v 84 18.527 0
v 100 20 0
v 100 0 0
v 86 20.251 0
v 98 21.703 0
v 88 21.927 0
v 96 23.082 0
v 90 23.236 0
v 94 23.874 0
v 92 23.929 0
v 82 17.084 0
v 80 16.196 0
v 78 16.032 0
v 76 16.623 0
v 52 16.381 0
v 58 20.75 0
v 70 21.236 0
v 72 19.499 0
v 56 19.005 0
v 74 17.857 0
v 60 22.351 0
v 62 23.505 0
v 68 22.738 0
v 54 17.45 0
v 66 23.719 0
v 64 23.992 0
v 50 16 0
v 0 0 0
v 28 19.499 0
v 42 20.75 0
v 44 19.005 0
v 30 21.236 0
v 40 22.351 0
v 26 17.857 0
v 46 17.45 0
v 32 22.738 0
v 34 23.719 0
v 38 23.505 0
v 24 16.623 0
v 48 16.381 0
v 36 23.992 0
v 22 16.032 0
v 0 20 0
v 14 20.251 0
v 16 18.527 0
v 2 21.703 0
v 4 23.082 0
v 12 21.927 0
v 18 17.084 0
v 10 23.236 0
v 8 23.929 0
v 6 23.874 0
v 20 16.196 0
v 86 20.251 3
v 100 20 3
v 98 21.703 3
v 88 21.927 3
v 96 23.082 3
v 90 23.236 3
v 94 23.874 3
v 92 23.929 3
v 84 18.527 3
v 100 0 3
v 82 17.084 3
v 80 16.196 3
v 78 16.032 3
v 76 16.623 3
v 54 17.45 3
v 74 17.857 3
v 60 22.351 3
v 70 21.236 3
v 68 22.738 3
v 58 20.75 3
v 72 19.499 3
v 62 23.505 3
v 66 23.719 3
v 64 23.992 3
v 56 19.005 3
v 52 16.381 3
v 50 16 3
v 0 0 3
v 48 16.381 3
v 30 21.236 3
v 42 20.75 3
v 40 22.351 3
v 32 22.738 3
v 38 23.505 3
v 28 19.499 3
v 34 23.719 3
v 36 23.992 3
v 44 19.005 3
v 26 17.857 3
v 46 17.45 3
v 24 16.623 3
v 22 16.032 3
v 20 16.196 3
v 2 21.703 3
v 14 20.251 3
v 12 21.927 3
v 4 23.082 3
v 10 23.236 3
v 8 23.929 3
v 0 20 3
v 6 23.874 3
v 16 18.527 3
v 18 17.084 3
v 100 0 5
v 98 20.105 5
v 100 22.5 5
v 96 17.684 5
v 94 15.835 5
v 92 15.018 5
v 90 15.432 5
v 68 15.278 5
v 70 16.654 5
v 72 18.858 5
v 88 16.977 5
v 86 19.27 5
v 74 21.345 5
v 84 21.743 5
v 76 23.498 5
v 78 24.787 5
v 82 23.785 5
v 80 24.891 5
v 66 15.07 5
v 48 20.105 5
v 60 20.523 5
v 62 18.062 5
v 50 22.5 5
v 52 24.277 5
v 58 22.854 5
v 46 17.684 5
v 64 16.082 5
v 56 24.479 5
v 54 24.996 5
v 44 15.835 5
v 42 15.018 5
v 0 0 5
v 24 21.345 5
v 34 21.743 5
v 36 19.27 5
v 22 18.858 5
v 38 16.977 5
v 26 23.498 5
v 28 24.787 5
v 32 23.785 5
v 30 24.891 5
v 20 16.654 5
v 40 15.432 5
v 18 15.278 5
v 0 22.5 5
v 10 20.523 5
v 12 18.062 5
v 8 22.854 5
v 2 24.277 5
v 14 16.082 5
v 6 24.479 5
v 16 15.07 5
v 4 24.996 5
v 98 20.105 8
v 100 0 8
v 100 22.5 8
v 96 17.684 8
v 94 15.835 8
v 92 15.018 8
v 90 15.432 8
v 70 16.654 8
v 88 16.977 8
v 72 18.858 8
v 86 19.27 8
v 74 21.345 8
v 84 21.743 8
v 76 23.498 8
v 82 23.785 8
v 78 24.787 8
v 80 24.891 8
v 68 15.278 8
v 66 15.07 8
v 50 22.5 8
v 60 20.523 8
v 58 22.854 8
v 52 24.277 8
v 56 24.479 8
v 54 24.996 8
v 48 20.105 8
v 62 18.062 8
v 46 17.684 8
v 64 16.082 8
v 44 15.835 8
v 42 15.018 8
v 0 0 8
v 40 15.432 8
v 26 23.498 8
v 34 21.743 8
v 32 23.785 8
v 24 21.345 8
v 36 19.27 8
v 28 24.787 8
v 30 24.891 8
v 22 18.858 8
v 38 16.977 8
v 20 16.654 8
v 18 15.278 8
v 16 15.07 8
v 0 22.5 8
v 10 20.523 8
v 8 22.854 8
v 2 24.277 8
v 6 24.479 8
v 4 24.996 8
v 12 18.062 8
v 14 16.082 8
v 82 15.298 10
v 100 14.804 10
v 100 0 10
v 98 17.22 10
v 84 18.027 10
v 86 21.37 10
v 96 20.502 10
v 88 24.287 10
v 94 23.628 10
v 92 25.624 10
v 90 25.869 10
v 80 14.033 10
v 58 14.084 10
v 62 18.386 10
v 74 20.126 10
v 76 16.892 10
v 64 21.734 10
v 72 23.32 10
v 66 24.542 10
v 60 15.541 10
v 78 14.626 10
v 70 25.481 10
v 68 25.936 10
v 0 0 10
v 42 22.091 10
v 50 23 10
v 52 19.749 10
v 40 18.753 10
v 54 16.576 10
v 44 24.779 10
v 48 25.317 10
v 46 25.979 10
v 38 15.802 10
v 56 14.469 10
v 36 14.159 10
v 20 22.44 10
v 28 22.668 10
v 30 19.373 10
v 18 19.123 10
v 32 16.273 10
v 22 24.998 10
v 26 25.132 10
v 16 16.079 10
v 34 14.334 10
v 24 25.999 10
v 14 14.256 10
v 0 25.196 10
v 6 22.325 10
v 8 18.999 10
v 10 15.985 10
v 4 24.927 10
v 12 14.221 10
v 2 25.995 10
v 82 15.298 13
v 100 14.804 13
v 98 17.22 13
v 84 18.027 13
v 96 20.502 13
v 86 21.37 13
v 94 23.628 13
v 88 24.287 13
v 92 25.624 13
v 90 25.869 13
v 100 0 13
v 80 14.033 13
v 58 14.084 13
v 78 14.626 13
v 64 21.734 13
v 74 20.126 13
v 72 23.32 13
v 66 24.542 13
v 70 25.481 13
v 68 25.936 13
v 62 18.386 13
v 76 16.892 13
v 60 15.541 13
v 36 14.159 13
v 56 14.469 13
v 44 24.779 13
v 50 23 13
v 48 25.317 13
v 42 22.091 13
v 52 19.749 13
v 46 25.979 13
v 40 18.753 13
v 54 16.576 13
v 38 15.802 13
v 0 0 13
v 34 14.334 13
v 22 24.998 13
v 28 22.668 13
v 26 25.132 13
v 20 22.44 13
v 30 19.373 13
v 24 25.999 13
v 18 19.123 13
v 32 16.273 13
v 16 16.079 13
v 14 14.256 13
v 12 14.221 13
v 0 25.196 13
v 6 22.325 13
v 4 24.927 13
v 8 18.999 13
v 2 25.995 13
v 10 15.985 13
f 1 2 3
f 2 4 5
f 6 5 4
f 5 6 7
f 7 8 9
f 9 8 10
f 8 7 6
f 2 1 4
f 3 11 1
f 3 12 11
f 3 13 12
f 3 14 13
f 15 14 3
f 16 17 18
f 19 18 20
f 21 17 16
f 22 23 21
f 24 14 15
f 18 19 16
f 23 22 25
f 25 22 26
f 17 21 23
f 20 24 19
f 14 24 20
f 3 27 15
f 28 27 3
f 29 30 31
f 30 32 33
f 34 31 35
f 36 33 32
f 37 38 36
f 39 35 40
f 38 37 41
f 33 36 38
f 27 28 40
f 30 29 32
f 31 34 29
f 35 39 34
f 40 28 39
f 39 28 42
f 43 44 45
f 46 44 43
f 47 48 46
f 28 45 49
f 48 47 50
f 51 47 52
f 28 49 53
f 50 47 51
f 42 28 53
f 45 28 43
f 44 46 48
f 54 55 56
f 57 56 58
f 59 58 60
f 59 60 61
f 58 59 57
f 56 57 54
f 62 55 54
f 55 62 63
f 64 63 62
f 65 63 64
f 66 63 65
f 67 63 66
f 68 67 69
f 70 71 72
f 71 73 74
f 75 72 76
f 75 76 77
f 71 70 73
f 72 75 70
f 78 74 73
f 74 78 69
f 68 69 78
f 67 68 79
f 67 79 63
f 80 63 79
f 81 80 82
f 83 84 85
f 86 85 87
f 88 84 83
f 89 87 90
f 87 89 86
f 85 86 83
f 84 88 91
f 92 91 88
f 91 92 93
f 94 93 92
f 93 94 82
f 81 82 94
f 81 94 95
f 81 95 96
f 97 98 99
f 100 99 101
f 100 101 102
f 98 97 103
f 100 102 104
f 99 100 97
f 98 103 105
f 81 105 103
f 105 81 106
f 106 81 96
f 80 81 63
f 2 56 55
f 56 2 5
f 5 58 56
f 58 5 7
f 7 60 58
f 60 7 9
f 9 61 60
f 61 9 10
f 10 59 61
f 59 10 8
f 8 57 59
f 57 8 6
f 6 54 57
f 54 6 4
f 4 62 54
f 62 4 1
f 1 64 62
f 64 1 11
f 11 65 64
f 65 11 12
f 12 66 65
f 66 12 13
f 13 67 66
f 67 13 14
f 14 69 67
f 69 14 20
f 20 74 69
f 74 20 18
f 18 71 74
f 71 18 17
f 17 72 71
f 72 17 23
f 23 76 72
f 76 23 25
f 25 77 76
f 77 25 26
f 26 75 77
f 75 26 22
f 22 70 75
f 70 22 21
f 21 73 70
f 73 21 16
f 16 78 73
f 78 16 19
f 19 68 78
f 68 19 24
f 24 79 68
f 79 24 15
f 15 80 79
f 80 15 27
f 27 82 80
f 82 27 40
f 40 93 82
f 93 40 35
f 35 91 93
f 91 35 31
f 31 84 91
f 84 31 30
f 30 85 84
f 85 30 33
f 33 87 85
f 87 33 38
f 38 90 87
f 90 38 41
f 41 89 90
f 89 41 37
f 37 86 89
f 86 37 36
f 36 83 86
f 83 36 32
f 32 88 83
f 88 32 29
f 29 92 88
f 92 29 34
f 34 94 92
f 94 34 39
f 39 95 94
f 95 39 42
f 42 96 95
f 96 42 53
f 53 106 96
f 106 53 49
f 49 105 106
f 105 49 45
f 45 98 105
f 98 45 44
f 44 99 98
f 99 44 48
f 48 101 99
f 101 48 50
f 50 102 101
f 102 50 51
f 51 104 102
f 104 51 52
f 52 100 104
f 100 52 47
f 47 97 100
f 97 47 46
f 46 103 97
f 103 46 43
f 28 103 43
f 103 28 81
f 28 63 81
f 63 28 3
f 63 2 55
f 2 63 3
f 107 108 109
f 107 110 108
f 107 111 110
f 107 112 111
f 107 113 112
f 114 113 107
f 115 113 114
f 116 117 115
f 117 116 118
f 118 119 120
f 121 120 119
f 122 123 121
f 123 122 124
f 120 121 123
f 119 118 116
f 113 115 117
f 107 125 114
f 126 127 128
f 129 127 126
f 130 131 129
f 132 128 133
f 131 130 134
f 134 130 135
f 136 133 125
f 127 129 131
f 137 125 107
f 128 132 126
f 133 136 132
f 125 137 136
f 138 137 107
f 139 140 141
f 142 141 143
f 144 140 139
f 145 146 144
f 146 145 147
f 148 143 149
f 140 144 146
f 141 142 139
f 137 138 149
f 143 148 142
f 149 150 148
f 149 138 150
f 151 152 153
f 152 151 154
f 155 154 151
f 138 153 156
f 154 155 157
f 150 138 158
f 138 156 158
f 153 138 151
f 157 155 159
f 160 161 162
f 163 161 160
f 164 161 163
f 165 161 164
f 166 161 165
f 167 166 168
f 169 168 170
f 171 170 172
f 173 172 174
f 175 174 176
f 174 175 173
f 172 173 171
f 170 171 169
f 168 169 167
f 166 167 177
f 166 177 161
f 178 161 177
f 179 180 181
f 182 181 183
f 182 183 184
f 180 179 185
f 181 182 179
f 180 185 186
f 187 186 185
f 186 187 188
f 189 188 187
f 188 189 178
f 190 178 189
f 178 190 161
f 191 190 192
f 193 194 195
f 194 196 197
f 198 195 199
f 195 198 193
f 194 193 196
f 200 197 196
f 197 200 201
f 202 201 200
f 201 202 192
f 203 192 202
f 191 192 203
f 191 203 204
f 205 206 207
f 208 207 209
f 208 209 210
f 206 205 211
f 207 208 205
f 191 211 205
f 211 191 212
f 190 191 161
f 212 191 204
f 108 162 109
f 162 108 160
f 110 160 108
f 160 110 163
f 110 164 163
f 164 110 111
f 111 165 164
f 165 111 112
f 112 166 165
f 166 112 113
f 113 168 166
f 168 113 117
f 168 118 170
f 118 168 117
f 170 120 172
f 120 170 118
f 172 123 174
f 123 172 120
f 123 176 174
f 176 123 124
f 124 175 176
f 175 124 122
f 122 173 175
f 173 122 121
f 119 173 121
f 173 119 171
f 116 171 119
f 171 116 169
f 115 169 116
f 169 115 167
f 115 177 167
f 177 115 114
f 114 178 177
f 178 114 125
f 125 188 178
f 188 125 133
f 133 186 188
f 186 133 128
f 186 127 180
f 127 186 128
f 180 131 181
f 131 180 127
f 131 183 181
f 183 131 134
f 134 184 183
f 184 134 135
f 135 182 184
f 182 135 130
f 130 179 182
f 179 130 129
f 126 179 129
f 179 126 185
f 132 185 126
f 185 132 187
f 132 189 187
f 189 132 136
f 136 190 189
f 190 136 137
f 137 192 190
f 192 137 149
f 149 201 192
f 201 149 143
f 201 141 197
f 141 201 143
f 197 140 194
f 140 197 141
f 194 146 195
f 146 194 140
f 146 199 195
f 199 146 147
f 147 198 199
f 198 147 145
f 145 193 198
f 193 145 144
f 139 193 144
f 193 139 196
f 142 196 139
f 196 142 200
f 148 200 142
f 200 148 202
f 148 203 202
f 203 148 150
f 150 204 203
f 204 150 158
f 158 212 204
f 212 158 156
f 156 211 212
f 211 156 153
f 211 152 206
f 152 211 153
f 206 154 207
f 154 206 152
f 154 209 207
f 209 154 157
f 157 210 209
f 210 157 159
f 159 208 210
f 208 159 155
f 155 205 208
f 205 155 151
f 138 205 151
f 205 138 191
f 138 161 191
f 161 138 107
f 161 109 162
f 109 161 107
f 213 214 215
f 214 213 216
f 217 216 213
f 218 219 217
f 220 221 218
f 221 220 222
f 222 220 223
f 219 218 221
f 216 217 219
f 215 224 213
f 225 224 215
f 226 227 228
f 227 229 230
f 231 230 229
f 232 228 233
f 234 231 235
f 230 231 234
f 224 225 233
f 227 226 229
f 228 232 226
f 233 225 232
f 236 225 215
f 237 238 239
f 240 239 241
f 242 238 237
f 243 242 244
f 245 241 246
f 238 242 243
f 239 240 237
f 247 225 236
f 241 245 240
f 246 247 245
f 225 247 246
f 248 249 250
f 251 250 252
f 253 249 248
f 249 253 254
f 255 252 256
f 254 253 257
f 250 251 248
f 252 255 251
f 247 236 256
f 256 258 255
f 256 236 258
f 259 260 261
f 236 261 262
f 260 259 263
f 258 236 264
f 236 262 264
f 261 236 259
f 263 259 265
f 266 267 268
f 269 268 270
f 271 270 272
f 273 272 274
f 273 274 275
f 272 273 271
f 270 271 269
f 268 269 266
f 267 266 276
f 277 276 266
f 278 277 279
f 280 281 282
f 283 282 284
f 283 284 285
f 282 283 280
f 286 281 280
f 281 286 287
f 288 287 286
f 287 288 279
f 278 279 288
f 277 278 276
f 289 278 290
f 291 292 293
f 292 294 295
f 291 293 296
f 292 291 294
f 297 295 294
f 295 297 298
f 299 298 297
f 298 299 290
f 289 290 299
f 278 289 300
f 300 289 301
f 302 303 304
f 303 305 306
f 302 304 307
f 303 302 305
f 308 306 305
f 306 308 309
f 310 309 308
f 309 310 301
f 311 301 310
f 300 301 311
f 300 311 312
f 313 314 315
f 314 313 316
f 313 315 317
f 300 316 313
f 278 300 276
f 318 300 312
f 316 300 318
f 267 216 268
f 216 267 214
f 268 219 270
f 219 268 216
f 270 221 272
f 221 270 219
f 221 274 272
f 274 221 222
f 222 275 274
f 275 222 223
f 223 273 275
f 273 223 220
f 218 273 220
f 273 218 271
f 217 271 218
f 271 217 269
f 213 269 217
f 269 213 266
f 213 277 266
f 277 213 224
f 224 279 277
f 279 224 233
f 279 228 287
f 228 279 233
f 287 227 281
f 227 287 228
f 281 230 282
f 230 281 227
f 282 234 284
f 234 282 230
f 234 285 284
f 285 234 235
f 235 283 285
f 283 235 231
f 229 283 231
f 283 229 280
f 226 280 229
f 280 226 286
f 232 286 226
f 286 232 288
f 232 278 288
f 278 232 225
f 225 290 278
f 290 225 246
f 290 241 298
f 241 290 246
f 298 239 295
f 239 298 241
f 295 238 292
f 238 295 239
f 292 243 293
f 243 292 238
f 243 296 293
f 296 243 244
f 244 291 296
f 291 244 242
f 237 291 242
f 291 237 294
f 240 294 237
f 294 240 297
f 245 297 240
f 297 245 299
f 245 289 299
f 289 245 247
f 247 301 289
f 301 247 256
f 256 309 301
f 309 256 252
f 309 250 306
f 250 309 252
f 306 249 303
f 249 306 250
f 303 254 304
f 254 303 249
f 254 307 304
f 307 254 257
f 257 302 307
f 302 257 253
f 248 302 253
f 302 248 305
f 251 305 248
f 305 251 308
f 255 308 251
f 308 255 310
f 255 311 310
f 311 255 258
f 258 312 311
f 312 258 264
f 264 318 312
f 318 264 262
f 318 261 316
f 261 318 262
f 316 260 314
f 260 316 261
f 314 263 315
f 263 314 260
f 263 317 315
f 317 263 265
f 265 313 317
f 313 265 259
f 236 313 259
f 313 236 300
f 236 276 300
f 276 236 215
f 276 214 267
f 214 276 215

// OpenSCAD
// =============================================================================
// OCEAN WAVE LAYERS - Standalone Component
// Starry Night Kinetic Sculpture - Static Decorative Elements
// =============================================================================
// 3 layered wave shapes creating depth in ocean area (Zone 1 - Far Ocean)
// STATIC - No animation required
// =============================================================================

$fn = 64;

// =============================================================================
// PARAMETERS
// =============================================================================

// Layer dimensions
WAVE_WIDTH = 100;       // mm - along X-axis
WAVE_DEPTH = 40;        // mm - along Y-axis
WAVE_THICKNESS = 3;     // mm - Z height of each layer

// Z positions for each layer
L1_Z = 0;               // Base layer (darkest)
L2_Z = 5;               // Middle layer
L3_Z = 10;              // Top layer (lightest)

// Wave profile parameters (vary per layer for organic look)
L1_AMPLITUDE = 4;       // mm - wave height
L1_FREQUENCY = 3.5;     // cycles across width
L1_PHASE = 0;           // degrees

L2_AMPLITUDE = 5;       // mm - slightly larger
L2_FREQUENCY = 4.0;     // slightly more waves
L2_PHASE = 30;          // offset for variation

L3_AMPLITUDE = 6;       // mm - largest waves
L3_FREQUENCY = 4.5;     // most waves
L3_PHASE = 60;          // further offset

// Colors - blue gradient (dark to light)
L1_COLOR = [0.1, 0.2, 0.5];    // Dark blue
L2_COLOR = [0.2, 0.4, 0.7];    // Medium blue
L3_COLOR = [0.4, 0.6, 0.9];    // Light blue

// Resolution for wave polygon
WAVE_RESOLUTION = 2;    // mm step size along X

// =============================================================================
// WAVE LAYER MODULE
// =============================================================================

// Creates a single wave layer with wavy top edge
// Parameters:
//   width      - total width along X
//   depth      - depth along Y (base depth before waves)
//   thickness  - extrusion height (Z)
//   amplitude  - wave height variation
//   frequency  - number of wave cycles
//   phase      - phase offset in degrees
module wave_layer(width, depth, thickness, amplitude, frequency, phase=0) {

    // Calculate angular frequency (degrees per mm)
    ang_freq = frequency * 360 / width;

    linear_extrude(height = thickness) {
        polygon(
            concat(
                // Top edge - wavy profile using sin()
                [for (x = [0 : WAVE_RESOLUTION : width])
                    [x, depth/2 + amplitude * sin(x * ang_freq + phase)]
                ],
                // Ensure we hit the exact end point
                [[width, depth/2 + amplitude * sin(width * ang_freq + phase)]],
                // Bottom edge - flat, closing the polygon
                [[width, 0]],
                [[0, 0]]
            )
        );
    }
}

// =============================================================================
// INDIVIDUAL LAYER MODULES
// =============================================================================

// Layer 1 - Deepest, darkest blue
module ocean_wave_L1() {
    color(L1_COLOR)
    translate([0, 0, L1_Z])
    wave_layer(
        width = WAVE_WIDTH,
        depth = WAVE_DEPTH,
        thickness = WAVE_THICKNESS,
        amplitude = L1_AMPLITUDE,
        frequency = L1_FREQUENCY,
        phase = L1_PHASE
    );
}

// Layer 2 - Middle, medium blue
module ocean_wave_L2() {
    color(L2_COLOR)
    translate([0, 0, L2_Z])
    wave_layer(
        width = WAVE_WIDTH,
        depth = WAVE_DEPTH,
        thickness = WAVE_THICKNESS,
        amplitude = L2_AMPLITUDE,
        frequency = L2_FREQUENCY,
        phase = L2_PHASE
    );
}

// Layer 3 - Top, lightest blue
module ocean_wave_L3() {
    color(L3_COLOR)
    translate([0, 0, L3_Z])
    wave_layer(
        width = WAVE_WIDTH,
        depth = WAVE_DEPTH,
        thickness = WAVE_THICKNESS,
        amplitude = L3_AMPLITUDE,
        frequency = L3_FREQUENCY,
        phase = L3_PHASE
    );
}

// =============================================================================
// ASSEMBLED VIEW MODULE
// =============================================================================

// All 3 layers stacked together
module ocean_waves_assembled() {
    ocean_wave_L1();
    ocean_wave_L2();
    ocean_wave_L3();
}

// =============================================================================
// MAIN - Show assembled view when run directly
// =============================================================================

ocean_waves_assembled();

// =============================================================================
// NOTES
// =============================================================================
// - Each layer is a separate printable piece
// - Print in different shades of blue filament for effect
// - Layers stack with 2mm gaps between tops
// - Wave profiles vary to create organic, natural look
// - Static shapes - no rotation or animation required
// =============================================================================
